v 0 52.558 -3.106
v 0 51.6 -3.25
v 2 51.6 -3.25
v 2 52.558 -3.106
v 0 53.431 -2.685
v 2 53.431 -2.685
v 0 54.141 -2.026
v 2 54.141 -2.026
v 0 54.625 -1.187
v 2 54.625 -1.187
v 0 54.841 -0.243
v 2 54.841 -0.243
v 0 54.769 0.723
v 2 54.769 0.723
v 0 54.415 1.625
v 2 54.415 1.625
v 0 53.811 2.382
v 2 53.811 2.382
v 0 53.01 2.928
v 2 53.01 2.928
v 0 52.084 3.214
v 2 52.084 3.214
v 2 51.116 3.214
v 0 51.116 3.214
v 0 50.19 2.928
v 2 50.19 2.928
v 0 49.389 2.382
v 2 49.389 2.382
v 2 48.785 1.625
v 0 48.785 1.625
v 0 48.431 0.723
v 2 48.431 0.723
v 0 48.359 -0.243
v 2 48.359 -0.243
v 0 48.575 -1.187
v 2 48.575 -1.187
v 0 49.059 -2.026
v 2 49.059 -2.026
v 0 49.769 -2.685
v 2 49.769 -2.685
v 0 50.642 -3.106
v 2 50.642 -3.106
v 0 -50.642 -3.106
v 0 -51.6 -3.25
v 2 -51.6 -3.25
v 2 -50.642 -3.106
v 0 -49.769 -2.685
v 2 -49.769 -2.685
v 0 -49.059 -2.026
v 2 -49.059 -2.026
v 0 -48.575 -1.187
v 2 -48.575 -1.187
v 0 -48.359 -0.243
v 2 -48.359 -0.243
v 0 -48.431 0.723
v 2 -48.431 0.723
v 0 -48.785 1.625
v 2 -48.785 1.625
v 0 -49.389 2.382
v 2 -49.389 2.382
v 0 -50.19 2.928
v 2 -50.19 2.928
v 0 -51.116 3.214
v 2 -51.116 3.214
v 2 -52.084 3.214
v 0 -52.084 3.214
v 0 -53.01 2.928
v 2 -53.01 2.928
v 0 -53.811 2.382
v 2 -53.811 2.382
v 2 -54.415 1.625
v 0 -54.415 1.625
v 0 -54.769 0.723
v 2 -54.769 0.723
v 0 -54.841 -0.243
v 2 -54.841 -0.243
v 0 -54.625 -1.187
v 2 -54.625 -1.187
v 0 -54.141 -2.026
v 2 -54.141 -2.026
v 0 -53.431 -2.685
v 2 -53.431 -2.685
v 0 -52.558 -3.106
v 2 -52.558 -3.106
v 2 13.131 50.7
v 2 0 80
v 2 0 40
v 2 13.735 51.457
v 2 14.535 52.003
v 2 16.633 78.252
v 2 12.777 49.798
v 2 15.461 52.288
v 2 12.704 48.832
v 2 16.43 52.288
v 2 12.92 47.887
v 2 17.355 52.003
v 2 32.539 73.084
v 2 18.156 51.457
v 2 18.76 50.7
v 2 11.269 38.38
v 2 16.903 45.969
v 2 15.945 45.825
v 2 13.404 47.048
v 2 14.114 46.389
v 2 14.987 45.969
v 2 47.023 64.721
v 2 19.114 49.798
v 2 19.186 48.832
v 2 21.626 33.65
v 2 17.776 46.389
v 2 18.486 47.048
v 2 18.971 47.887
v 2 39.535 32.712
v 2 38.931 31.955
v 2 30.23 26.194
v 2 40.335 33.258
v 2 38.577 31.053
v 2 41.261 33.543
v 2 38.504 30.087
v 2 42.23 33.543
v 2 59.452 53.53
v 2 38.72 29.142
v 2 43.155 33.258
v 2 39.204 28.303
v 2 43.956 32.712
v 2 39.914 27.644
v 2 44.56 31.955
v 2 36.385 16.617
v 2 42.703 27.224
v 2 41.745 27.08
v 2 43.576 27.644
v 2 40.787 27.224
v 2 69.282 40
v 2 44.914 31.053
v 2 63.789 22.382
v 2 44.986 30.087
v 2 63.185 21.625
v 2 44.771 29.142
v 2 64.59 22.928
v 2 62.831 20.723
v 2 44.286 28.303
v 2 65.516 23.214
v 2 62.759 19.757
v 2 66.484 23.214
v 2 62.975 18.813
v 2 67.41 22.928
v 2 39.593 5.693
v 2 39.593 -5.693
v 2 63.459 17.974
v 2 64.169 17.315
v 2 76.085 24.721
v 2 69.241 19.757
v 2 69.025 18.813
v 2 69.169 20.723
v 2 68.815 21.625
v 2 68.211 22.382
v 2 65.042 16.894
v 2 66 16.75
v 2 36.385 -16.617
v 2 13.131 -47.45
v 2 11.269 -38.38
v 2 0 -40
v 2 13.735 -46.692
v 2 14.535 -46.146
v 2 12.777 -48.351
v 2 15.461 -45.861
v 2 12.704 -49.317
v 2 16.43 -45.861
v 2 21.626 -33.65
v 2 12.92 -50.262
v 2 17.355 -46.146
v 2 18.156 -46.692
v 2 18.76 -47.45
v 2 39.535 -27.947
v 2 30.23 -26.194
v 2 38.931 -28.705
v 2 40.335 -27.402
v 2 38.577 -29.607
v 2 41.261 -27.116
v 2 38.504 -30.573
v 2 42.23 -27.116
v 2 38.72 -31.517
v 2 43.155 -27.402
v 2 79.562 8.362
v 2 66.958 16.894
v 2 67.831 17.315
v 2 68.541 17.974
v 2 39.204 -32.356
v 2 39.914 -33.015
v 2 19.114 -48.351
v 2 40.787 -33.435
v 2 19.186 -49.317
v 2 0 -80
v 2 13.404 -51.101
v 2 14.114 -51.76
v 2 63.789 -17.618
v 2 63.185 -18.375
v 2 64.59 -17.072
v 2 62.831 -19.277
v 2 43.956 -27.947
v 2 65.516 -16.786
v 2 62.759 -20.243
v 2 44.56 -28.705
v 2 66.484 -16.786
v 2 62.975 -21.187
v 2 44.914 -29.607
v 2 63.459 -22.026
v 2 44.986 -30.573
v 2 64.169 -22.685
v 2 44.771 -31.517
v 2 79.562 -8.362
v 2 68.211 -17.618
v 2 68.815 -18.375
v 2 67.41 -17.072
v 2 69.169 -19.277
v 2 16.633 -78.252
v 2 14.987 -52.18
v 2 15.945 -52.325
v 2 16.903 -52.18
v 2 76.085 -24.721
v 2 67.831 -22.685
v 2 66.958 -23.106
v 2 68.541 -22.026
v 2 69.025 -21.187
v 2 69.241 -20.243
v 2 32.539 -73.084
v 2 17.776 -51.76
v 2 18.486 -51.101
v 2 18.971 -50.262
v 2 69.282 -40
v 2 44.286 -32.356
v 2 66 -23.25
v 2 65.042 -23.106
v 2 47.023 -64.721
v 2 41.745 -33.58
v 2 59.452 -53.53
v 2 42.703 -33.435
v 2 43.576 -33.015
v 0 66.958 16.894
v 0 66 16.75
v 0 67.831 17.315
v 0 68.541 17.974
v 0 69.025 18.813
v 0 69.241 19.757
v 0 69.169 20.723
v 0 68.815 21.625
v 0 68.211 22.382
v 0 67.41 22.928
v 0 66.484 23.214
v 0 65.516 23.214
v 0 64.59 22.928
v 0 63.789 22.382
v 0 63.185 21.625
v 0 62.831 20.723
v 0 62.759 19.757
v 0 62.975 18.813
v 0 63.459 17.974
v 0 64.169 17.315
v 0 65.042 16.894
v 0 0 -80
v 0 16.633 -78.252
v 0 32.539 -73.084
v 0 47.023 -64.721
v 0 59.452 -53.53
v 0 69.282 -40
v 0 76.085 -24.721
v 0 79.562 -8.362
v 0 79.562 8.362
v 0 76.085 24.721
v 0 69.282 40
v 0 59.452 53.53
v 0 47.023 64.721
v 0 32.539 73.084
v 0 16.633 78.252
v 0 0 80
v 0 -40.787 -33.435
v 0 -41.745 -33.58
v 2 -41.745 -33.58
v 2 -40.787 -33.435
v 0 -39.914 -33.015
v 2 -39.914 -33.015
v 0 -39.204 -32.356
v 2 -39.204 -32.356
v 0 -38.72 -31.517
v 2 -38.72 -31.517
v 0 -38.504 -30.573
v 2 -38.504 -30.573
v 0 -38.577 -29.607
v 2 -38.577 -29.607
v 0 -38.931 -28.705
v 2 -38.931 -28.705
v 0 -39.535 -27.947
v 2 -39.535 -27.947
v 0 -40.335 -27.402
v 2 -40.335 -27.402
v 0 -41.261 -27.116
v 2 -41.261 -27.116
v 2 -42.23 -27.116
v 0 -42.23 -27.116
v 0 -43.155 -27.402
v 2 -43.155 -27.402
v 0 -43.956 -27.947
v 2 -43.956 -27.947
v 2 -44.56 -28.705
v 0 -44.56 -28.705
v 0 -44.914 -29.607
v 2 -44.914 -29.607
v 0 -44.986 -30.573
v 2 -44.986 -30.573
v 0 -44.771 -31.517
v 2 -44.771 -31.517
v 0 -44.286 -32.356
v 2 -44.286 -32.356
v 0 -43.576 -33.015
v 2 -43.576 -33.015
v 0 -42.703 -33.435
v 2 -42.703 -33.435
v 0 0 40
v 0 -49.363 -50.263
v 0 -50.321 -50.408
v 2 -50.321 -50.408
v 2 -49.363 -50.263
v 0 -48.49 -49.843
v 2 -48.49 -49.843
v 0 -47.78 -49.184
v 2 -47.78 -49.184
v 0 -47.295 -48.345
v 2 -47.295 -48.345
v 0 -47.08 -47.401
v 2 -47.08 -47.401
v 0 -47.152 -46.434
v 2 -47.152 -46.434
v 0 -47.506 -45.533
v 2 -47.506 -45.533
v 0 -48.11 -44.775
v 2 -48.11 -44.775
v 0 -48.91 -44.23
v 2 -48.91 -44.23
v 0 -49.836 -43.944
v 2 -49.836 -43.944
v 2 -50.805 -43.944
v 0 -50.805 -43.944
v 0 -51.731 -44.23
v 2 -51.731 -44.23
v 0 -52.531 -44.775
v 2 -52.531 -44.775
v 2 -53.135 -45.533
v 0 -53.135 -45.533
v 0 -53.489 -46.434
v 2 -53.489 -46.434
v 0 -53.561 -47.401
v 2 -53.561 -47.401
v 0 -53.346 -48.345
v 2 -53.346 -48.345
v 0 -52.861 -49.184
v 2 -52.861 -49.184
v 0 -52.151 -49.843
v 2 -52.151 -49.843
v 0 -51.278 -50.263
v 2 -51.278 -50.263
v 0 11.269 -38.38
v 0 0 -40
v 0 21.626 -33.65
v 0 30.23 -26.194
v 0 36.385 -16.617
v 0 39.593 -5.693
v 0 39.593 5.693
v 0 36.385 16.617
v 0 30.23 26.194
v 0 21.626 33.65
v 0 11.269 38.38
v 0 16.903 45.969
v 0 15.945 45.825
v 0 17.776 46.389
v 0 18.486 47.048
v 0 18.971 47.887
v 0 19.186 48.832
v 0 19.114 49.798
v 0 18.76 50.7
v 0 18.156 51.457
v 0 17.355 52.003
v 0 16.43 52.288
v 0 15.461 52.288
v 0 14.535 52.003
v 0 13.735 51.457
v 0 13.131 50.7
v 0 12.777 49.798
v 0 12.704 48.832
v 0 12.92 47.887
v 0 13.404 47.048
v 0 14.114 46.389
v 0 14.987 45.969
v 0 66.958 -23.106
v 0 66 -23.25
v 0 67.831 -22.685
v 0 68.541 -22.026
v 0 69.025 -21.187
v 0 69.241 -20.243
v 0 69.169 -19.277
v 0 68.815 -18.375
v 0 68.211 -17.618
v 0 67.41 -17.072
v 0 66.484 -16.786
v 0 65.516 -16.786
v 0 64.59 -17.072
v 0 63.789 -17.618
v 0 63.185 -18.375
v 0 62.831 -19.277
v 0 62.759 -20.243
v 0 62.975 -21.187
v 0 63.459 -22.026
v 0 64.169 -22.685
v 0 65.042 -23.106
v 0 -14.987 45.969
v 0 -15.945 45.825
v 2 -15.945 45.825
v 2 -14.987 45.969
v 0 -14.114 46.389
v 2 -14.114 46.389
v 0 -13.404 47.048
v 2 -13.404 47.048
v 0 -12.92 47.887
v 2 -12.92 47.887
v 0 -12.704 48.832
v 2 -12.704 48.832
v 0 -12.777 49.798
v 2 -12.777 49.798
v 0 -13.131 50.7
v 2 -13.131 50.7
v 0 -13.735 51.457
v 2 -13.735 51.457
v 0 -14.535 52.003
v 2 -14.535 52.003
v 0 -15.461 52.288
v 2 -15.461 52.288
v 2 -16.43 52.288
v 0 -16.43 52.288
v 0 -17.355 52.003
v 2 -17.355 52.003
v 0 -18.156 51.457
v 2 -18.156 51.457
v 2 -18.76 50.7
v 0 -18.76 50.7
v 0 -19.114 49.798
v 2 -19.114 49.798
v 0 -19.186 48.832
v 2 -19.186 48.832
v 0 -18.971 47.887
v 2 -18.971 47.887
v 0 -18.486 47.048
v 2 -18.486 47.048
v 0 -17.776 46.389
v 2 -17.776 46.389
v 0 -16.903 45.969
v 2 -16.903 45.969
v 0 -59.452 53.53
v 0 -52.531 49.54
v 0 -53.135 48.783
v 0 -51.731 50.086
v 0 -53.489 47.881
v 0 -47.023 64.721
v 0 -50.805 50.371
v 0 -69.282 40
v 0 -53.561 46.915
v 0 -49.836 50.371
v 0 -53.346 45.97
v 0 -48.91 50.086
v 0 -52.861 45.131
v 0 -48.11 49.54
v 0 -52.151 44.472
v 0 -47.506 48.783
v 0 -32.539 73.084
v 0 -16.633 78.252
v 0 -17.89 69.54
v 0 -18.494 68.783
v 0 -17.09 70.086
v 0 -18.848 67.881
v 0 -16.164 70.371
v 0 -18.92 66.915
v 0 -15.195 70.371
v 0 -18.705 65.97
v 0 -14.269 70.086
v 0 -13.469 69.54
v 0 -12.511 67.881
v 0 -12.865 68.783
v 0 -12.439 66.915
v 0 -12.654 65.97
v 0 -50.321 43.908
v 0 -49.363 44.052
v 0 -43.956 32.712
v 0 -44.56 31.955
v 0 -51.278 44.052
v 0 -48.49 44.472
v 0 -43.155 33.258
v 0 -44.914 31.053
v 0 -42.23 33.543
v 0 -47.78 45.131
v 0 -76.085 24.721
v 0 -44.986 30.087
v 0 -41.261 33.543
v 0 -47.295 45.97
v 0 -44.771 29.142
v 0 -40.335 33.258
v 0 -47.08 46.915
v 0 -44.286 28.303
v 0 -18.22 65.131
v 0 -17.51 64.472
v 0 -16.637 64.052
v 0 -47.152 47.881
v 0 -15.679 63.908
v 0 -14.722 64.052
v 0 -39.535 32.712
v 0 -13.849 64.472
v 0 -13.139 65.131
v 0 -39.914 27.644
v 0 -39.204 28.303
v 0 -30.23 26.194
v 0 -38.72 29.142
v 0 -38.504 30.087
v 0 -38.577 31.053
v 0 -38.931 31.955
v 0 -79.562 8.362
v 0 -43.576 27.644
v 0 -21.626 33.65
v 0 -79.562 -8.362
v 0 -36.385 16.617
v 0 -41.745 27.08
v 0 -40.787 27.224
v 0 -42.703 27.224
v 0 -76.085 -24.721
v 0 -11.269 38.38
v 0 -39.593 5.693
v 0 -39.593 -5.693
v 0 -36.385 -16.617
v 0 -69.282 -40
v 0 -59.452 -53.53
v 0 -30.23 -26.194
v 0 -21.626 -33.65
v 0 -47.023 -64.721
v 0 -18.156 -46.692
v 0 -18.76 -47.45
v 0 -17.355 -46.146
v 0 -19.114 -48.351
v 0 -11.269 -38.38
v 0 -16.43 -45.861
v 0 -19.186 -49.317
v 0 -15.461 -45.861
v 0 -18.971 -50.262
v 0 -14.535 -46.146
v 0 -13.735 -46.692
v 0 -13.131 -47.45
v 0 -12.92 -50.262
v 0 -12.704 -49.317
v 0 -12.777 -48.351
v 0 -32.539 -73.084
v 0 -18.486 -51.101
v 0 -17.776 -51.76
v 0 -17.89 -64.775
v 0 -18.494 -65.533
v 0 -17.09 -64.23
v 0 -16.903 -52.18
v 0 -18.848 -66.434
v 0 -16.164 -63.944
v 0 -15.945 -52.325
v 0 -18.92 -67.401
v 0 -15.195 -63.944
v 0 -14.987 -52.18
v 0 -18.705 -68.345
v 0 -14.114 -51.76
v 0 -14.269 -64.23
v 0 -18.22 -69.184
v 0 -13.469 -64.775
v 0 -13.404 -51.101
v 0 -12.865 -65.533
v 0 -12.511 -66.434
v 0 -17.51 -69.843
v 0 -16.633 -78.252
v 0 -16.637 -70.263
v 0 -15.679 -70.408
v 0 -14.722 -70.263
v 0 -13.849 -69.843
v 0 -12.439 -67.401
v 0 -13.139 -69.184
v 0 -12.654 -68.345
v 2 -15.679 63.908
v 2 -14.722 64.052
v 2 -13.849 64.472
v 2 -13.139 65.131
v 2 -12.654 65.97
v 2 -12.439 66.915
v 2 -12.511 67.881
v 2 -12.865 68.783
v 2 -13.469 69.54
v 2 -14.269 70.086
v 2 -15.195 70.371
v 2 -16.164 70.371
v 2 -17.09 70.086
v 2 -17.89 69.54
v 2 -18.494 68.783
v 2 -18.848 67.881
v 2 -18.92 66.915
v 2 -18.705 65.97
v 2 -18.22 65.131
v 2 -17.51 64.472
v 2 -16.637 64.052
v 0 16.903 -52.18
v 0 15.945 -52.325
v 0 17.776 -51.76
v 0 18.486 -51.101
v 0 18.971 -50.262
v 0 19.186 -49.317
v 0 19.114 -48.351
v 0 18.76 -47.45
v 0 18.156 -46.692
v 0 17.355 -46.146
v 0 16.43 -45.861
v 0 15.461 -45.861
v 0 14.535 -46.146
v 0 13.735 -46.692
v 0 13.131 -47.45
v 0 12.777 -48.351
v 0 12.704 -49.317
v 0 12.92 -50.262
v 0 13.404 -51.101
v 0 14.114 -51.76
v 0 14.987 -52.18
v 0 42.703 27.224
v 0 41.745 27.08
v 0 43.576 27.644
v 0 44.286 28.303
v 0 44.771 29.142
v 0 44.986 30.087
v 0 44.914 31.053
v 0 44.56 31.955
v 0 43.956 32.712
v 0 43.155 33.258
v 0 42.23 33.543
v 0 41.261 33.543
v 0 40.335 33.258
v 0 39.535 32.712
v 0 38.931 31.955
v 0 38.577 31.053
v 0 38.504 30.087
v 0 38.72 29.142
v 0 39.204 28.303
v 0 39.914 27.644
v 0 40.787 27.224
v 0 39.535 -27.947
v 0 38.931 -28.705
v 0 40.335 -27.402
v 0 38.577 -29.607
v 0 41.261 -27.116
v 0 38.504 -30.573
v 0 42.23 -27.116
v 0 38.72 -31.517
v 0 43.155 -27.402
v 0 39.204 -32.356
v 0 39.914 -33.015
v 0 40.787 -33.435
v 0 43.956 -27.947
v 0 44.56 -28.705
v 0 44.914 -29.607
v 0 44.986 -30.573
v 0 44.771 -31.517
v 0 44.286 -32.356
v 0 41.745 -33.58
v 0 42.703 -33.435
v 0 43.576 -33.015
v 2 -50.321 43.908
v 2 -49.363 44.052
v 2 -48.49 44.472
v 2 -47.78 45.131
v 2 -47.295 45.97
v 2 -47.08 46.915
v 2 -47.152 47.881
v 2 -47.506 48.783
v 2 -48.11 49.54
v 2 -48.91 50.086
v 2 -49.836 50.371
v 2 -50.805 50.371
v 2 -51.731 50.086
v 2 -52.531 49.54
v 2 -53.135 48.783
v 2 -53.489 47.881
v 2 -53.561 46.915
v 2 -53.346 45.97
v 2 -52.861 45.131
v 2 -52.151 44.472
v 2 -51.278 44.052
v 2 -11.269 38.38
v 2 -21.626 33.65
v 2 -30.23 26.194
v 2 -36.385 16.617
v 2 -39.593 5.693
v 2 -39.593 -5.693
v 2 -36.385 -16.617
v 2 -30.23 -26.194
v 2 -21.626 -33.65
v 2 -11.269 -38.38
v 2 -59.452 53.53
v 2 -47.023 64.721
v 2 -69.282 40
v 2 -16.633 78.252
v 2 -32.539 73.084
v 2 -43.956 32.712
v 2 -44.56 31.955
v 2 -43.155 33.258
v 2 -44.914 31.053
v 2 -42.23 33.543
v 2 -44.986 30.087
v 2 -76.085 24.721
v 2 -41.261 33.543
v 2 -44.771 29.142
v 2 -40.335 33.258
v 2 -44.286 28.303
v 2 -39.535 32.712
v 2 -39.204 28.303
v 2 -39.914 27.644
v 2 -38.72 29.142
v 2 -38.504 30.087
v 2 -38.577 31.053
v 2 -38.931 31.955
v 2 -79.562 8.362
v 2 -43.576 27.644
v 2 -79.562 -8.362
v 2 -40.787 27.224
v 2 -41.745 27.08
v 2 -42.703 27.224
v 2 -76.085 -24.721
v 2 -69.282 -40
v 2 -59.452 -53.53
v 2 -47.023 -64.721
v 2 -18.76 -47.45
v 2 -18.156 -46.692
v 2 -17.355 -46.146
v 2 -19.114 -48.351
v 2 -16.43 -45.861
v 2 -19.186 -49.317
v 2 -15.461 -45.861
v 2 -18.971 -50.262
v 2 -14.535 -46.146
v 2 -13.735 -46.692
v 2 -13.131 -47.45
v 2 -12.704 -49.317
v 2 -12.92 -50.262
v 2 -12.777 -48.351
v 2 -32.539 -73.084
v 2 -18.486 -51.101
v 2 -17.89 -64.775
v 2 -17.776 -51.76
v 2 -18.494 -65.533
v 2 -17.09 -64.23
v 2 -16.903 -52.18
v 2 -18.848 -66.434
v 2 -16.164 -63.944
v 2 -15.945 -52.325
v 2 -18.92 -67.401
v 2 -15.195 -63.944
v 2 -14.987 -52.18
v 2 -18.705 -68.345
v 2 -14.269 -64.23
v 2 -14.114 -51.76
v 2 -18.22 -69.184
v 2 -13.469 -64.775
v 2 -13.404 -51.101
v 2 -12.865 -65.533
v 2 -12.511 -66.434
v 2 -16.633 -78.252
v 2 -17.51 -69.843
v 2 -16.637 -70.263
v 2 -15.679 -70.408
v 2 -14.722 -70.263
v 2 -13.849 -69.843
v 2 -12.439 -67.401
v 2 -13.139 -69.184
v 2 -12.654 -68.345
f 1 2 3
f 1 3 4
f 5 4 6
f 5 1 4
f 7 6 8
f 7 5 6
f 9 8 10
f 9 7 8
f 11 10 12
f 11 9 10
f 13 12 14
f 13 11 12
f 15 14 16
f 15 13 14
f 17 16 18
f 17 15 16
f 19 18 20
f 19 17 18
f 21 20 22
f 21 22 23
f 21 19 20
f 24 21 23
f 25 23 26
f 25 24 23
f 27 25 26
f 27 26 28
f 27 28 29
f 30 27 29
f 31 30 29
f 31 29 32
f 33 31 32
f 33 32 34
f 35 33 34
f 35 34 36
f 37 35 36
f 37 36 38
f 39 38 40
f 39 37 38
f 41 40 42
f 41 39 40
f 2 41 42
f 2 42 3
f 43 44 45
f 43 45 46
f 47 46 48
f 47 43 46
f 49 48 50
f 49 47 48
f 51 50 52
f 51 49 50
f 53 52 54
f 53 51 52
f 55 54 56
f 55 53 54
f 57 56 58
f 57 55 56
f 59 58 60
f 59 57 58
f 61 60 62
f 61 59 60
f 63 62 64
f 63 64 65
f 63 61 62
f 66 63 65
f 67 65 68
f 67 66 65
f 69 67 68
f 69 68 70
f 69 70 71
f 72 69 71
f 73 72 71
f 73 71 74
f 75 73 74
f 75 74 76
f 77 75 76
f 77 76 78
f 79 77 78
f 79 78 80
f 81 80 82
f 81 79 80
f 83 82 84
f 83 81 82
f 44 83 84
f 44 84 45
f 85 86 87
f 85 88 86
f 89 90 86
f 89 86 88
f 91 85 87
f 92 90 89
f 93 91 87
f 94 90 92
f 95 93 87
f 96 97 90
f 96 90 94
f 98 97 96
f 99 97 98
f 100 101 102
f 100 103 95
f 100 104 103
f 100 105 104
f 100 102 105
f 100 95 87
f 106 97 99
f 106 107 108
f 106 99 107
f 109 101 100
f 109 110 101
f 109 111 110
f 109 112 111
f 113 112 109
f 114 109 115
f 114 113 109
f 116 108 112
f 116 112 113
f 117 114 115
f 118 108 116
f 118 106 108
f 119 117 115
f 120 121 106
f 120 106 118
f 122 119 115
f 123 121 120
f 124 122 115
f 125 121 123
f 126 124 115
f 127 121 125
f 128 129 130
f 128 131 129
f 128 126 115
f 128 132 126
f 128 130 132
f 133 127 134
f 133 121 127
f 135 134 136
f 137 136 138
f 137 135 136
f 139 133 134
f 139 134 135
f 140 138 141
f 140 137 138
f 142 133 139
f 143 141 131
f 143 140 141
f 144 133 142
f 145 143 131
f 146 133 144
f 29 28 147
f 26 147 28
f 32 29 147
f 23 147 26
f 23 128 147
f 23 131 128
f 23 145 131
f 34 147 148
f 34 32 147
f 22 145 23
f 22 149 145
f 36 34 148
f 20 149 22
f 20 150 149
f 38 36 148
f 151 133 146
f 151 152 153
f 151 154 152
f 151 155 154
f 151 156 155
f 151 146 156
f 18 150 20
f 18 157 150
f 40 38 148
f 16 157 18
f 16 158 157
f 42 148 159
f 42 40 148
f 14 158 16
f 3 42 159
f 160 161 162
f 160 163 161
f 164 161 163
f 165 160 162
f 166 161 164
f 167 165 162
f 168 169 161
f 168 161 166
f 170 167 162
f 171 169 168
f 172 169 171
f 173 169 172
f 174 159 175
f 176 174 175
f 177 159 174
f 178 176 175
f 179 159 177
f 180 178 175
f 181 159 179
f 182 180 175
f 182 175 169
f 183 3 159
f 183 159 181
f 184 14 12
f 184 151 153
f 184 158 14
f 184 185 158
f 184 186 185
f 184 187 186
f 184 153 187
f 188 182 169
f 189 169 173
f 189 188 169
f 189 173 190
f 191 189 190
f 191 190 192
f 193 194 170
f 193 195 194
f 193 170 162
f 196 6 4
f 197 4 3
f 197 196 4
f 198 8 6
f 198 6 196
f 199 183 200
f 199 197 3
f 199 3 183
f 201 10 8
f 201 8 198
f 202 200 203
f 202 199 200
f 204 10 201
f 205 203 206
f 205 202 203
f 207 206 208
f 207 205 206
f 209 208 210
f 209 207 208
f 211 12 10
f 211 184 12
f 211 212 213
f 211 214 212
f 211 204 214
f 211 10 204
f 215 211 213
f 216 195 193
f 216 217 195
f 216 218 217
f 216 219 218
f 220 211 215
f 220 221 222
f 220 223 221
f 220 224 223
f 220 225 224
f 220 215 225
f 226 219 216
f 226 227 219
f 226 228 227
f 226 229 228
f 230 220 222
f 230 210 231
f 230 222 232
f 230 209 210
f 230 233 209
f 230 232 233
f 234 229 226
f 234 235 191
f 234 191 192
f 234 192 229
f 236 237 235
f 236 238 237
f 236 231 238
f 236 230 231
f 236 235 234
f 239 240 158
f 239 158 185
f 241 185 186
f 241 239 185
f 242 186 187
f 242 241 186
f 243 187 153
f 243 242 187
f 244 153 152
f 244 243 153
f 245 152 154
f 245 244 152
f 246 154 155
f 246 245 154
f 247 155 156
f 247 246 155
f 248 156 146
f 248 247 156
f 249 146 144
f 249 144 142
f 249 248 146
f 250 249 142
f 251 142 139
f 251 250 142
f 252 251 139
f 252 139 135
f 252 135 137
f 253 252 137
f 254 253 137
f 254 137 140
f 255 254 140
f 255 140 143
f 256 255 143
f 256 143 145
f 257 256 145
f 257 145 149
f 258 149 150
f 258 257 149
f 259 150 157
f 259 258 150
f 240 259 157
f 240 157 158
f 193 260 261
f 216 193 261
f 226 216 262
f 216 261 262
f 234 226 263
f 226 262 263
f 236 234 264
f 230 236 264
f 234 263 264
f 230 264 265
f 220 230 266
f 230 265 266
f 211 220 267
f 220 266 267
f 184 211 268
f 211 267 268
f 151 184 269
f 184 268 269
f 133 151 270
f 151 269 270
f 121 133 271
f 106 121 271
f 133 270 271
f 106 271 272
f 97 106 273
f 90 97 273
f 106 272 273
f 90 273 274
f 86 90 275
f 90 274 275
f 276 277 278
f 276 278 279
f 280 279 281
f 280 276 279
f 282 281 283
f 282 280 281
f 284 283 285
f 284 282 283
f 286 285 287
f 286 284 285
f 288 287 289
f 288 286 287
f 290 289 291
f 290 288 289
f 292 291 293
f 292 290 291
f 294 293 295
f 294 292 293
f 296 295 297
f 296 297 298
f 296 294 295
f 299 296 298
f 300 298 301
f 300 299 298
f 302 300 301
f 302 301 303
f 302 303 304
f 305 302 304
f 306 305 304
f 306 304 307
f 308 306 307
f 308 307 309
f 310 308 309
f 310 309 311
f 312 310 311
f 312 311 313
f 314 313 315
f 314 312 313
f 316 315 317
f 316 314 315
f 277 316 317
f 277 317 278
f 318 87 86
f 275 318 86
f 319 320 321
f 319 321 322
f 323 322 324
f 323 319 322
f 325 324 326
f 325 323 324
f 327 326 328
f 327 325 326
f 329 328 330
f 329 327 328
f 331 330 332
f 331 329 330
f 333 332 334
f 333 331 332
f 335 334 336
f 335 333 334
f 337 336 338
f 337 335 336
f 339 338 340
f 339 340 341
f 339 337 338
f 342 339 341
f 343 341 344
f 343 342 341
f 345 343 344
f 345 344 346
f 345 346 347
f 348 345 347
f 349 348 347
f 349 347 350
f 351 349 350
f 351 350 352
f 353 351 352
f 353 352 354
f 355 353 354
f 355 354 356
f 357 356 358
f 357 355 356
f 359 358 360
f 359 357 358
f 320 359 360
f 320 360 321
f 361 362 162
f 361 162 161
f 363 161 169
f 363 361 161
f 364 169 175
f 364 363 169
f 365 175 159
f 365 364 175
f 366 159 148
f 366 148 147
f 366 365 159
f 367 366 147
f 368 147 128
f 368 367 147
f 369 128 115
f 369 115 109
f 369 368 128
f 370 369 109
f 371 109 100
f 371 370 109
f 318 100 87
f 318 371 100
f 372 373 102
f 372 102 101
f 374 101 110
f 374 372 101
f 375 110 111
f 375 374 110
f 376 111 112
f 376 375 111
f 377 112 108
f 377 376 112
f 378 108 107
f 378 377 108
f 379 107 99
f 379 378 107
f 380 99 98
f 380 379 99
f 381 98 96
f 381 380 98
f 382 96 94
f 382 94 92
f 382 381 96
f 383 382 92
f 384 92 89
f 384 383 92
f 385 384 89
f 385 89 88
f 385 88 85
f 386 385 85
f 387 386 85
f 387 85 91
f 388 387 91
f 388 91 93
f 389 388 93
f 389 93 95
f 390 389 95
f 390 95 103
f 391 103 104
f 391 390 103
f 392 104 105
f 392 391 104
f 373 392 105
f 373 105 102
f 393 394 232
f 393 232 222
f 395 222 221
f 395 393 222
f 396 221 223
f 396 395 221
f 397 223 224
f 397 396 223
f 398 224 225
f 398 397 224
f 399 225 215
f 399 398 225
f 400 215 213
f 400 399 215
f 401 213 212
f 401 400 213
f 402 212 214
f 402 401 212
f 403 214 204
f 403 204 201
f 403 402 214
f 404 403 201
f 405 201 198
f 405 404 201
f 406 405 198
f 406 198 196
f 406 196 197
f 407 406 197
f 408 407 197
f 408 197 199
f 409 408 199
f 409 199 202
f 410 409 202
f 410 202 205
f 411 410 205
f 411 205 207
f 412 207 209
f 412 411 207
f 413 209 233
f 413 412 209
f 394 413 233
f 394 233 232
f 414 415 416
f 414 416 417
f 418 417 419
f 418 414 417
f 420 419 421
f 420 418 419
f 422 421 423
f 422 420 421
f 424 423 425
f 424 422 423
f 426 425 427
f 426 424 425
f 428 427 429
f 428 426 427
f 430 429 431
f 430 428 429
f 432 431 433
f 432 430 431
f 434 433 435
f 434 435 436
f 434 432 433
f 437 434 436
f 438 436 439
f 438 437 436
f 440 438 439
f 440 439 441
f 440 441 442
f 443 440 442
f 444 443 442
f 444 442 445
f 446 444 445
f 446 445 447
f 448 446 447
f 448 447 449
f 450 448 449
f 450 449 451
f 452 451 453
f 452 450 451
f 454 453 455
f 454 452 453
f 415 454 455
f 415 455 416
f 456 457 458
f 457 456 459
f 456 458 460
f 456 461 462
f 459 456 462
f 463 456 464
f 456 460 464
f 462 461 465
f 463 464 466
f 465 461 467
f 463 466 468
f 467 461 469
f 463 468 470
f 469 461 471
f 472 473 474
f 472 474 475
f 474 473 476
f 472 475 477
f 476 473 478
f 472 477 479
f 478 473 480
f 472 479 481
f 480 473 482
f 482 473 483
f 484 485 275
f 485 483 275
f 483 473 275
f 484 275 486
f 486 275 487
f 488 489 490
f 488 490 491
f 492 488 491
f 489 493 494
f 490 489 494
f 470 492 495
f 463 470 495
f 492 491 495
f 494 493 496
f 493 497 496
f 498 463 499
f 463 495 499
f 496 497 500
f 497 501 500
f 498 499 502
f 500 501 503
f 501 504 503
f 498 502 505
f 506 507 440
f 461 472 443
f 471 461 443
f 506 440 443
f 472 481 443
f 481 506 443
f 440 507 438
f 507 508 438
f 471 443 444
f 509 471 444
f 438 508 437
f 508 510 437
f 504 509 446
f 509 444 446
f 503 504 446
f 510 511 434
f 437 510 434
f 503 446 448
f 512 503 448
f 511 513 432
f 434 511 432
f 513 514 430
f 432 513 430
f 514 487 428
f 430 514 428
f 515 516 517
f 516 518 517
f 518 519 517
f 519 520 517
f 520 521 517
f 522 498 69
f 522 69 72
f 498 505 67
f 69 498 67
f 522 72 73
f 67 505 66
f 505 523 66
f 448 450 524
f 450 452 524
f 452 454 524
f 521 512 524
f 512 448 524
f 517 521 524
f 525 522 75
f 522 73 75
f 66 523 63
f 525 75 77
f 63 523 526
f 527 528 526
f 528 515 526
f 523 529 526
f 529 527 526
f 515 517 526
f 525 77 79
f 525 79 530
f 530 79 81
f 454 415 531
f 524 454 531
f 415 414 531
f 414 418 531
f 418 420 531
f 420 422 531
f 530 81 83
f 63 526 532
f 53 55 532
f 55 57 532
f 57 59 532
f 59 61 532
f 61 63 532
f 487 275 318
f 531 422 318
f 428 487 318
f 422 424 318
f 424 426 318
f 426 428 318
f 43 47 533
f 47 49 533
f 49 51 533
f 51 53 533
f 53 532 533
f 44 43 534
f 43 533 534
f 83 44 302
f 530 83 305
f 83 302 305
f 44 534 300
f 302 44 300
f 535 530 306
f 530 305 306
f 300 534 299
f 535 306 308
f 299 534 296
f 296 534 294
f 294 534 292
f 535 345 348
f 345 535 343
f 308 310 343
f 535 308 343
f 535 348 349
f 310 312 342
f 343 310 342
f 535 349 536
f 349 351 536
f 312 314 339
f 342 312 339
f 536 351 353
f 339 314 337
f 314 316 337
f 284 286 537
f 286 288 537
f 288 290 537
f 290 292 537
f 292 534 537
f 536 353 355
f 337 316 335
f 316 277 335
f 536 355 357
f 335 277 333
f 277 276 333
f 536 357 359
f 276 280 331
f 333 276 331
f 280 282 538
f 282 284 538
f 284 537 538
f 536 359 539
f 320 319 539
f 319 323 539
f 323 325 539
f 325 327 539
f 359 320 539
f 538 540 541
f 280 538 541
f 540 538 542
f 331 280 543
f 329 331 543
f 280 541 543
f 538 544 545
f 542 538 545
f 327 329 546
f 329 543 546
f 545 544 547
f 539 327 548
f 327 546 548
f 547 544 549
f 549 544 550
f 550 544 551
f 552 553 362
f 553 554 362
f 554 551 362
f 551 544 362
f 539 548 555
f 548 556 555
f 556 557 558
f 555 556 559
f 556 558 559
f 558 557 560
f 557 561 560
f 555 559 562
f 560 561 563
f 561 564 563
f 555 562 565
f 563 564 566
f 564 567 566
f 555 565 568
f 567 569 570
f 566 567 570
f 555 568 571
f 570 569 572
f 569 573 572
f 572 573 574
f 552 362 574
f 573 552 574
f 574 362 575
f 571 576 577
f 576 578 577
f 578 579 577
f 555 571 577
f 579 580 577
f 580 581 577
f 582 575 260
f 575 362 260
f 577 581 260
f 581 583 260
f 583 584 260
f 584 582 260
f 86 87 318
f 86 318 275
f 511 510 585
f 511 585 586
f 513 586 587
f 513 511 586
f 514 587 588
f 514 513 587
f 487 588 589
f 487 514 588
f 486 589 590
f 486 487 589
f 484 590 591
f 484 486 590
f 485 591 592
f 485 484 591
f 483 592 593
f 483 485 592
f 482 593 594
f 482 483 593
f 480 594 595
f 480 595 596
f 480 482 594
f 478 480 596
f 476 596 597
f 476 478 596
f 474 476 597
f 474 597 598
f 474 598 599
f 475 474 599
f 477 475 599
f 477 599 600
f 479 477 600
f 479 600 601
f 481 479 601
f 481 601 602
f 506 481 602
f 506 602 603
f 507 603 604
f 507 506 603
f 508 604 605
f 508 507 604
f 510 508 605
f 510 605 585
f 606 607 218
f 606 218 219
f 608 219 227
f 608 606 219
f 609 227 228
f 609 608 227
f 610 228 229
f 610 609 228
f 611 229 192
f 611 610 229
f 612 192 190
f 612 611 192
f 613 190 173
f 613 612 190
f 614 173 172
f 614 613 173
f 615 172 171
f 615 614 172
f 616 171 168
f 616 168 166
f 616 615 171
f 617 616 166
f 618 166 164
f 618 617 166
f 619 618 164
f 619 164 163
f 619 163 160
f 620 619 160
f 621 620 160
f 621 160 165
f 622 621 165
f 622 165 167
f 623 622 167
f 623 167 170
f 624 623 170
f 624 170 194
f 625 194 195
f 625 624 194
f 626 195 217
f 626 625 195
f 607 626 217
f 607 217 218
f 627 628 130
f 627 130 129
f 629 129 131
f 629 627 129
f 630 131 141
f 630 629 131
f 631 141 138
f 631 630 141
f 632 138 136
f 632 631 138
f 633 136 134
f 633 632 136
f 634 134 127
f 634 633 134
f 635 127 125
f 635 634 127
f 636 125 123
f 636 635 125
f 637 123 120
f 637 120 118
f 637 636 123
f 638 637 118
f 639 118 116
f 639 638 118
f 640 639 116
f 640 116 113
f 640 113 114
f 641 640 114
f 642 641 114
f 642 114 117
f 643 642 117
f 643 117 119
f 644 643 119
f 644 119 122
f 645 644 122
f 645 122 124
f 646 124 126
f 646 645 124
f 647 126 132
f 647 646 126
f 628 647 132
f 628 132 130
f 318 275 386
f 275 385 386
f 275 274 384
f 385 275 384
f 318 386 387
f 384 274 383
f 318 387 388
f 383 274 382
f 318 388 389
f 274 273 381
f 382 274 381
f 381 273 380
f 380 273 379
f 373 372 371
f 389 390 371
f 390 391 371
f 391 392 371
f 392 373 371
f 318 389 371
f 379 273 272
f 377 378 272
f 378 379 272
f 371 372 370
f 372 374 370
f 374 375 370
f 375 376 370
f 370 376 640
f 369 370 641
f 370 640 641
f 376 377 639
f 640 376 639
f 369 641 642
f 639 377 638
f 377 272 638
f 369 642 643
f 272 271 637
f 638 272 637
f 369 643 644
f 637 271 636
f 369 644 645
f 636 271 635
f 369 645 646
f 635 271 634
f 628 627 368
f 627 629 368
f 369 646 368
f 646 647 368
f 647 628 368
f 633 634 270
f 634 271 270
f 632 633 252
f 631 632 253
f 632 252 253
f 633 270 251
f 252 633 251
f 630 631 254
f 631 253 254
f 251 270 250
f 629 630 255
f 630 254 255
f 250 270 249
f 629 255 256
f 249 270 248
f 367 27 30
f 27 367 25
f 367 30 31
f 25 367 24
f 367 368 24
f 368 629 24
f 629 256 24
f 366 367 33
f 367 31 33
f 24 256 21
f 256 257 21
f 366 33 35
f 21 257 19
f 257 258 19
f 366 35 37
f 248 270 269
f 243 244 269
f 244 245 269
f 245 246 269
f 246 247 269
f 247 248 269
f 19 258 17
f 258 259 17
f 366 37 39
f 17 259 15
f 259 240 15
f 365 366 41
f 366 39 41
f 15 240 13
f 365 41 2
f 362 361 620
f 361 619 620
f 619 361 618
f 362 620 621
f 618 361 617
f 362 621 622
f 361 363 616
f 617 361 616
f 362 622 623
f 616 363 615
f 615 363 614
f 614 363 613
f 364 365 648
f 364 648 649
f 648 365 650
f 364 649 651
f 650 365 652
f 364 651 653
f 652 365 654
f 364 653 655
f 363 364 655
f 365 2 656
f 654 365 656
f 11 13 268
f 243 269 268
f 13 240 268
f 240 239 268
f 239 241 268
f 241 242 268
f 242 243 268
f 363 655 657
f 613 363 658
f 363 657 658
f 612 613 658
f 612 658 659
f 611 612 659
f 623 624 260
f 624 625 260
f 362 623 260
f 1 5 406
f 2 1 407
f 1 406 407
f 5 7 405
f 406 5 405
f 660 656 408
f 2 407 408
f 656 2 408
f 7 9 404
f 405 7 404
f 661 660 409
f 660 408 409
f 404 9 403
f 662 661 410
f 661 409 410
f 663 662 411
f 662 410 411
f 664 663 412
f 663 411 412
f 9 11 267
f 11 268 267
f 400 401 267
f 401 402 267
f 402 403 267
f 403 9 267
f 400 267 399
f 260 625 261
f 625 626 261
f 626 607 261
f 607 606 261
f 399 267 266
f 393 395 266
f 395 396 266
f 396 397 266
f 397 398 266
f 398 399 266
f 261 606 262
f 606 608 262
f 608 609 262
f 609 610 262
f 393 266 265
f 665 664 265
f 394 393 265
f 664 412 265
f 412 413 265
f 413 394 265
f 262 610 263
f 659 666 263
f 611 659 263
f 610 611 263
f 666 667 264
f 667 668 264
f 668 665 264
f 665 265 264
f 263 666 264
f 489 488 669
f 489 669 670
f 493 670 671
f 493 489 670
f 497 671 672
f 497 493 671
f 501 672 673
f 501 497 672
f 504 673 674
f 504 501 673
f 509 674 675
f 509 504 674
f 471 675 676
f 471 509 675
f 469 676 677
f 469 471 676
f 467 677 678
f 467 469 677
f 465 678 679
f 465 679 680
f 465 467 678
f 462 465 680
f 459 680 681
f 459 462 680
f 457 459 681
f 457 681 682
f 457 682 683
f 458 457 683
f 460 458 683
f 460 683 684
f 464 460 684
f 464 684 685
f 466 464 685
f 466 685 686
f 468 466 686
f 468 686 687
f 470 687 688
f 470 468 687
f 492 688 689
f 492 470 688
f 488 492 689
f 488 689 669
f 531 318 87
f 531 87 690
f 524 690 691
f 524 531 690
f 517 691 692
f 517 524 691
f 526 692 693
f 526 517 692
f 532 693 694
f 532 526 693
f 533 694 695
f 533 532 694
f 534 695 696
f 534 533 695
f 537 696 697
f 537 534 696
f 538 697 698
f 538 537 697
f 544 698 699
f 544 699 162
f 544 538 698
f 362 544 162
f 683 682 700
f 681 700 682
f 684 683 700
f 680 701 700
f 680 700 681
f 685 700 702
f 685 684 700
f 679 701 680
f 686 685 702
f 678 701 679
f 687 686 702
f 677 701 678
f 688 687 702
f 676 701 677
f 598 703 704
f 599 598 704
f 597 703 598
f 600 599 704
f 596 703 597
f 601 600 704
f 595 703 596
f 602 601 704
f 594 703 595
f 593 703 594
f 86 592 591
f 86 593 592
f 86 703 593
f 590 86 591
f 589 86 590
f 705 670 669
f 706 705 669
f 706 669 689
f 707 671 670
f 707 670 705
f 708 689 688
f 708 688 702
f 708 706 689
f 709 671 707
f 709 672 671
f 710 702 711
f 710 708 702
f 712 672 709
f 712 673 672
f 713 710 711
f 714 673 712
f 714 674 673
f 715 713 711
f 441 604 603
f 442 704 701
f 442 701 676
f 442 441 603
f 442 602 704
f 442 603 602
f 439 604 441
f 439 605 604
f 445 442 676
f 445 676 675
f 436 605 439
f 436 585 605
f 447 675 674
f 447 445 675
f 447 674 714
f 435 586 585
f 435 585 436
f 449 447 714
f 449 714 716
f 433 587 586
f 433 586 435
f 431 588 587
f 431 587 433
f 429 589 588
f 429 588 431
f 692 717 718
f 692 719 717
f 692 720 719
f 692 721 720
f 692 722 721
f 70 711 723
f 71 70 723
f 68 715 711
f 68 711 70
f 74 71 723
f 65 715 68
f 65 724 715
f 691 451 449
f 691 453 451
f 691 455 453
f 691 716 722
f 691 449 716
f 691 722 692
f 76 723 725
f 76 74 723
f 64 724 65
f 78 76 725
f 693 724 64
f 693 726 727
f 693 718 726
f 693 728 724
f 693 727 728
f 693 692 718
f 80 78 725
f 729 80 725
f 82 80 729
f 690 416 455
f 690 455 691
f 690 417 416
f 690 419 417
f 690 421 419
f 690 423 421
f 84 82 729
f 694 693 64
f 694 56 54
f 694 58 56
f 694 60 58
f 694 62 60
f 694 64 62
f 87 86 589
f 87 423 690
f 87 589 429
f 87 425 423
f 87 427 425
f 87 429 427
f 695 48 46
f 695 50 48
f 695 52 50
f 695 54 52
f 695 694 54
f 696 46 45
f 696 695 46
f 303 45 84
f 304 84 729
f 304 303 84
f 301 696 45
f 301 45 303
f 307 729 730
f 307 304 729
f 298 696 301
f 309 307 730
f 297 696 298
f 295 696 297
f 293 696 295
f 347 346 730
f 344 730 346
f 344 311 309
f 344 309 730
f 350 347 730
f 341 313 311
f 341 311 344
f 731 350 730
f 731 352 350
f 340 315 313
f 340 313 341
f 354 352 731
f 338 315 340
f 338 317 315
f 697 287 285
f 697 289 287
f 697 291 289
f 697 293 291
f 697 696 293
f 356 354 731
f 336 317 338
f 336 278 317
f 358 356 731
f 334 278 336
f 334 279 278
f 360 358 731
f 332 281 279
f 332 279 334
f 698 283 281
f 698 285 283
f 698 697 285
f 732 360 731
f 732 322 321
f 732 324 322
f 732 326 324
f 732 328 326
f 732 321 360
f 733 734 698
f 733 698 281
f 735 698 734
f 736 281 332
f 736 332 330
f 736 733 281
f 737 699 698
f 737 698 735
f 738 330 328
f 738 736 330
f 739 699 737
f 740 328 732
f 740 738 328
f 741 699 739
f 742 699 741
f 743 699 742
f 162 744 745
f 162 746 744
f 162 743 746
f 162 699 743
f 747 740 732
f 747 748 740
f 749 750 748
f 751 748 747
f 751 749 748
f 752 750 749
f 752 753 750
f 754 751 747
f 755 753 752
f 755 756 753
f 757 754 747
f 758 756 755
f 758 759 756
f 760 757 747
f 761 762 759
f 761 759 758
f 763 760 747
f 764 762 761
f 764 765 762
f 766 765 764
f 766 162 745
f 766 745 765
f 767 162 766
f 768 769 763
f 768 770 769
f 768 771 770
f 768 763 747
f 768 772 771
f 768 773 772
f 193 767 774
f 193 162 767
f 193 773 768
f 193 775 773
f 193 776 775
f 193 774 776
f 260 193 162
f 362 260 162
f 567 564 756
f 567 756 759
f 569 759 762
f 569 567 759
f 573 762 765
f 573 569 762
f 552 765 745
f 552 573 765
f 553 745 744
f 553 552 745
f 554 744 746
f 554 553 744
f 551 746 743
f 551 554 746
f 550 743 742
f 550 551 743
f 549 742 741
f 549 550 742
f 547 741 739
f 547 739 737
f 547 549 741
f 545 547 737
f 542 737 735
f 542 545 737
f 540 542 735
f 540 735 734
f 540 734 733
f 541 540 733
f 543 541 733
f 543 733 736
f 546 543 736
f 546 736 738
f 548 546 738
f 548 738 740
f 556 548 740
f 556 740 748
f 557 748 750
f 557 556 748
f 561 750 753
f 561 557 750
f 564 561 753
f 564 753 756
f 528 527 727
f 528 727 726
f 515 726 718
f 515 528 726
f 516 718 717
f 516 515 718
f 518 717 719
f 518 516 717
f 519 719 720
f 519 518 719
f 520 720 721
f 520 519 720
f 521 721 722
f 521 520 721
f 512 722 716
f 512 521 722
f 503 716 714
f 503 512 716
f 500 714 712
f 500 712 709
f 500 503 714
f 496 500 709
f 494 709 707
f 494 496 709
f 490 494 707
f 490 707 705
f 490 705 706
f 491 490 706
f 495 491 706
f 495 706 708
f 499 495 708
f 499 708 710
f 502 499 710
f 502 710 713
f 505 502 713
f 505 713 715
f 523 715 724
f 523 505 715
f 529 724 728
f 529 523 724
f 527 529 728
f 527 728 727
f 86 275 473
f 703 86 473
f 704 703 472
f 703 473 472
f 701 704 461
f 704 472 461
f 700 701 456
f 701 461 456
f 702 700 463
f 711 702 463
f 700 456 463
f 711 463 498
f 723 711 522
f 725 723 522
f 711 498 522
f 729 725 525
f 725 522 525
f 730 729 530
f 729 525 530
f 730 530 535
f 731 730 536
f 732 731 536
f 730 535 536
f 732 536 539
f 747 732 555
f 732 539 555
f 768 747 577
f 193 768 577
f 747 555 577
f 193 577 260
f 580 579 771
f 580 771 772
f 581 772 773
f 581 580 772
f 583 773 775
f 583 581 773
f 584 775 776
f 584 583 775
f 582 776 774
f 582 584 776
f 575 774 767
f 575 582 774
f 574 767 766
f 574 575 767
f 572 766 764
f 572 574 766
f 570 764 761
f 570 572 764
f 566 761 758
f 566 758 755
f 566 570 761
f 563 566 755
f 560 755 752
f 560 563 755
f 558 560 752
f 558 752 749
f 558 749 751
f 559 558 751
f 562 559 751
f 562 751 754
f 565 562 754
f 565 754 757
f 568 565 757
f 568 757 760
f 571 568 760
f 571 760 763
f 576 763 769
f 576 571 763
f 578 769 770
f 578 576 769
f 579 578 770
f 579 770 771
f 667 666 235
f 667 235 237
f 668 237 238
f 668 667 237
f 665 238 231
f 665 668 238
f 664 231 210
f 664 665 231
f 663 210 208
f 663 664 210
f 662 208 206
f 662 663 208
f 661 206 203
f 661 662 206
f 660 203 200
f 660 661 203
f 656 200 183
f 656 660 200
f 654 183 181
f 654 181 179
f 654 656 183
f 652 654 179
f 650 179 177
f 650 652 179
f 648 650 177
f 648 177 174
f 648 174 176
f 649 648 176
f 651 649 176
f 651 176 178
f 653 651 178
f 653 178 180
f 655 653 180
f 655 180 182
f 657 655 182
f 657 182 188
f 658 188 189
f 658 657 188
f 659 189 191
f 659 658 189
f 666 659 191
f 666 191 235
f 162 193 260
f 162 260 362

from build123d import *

# Parameters (mm, degrees)
SKETCH1_R           = 80
SKETCH1_R_2         = 40
SKETCH1_R_3         = 3.25
BOSS_EXTRUDE1_DEPTH = 2


with BuildPart() as part:
    # Sketch1 → Boss-Extrude1 (new body)
    with BuildSketch(Plane(origin=(0, 0, 0), x_dir=(0, 0, -1), z_dir=(1, 0, 0))):
        Circle(SKETCH1_R)
        Circle(SKETCH1_R_2, mode=Mode.SUBTRACT)
        with Locations((30.329719018, 41.74527691)):
            Circle(SKETCH1_R_3, mode=Mode.SUBTRACT)
        with Locations((49.074516241, 15.94527691)):
            Circle(SKETCH1_R_3, mode=Mode.SUBTRACT)
        with Locations((49.074516241, -15.94527691)):
            Circle(SKETCH1_R_3, mode=Mode.SUBTRACT)
        with Locations((30.329719018, -41.74527691)):
            Circle(SKETCH1_R_3, mode=Mode.SUBTRACT)
        with Locations((0, -51.6)):
            Circle(SKETCH1_R_3, mode=Mode.SUBTRACT)
        with Locations((-30.329719018, -41.74527691)):
            Circle(SKETCH1_R_3, mode=Mode.SUBTRACT)
        with Locations((-49.074516241, -15.94527691)):
            Circle(SKETCH1_R_3, mode=Mode.SUBTRACT)
        with Locations((-49.074516241, 15.94527691)):
            Circle(SKETCH1_R_3, mode=Mode.SUBTRACT)
        with Locations((-30.329719018, 41.74527691)):
            Circle(SKETCH1_R_3, mode=Mode.SUBTRACT)
        with Locations((0, 51.6)):
            Circle(SKETCH1_R_3, mode=Mode.SUBTRACT)
        with Locations((-20, 66)):
            Circle(SKETCH1_R_3, mode=Mode.SUBTRACT)
        with Locations((20, 66)):
            Circle(SKETCH1_R_3, mode=Mode.SUBTRACT)
        with Locations((67.15767665, -15.679491924)):
            Circle(SKETCH1_R_3, mode=Mode.SUBTRACT)
        with Locations((47.15767665, -50.320508076)):
            Circle(SKETCH1_R_3, mode=Mode.SUBTRACT)
        with Locations((-47.15767665, -50.320508076)):
            Circle(SKETCH1_R_3, mode=Mode.SUBTRACT)
        with Locations((-67.15767665, -15.679491924)):
            Circle(SKETCH1_R_3, mode=Mode.SUBTRACT)
    extrude(amount=BOSS_EXTRUDE1_DEPTH)


with BuildPart() as body_2:
    # Split1: the piece on the far side of the plane
    add(part.part)
    split(bisect_by=Plane.ZX, keep=Keep.BOTTOM)


with BuildPart() as part_1:
    add(part.part)

    # Split1
    split(bisect_by=Plane.ZX, keep=Keep.TOP)


solid = Compound([body_2.part, part_1.part])
